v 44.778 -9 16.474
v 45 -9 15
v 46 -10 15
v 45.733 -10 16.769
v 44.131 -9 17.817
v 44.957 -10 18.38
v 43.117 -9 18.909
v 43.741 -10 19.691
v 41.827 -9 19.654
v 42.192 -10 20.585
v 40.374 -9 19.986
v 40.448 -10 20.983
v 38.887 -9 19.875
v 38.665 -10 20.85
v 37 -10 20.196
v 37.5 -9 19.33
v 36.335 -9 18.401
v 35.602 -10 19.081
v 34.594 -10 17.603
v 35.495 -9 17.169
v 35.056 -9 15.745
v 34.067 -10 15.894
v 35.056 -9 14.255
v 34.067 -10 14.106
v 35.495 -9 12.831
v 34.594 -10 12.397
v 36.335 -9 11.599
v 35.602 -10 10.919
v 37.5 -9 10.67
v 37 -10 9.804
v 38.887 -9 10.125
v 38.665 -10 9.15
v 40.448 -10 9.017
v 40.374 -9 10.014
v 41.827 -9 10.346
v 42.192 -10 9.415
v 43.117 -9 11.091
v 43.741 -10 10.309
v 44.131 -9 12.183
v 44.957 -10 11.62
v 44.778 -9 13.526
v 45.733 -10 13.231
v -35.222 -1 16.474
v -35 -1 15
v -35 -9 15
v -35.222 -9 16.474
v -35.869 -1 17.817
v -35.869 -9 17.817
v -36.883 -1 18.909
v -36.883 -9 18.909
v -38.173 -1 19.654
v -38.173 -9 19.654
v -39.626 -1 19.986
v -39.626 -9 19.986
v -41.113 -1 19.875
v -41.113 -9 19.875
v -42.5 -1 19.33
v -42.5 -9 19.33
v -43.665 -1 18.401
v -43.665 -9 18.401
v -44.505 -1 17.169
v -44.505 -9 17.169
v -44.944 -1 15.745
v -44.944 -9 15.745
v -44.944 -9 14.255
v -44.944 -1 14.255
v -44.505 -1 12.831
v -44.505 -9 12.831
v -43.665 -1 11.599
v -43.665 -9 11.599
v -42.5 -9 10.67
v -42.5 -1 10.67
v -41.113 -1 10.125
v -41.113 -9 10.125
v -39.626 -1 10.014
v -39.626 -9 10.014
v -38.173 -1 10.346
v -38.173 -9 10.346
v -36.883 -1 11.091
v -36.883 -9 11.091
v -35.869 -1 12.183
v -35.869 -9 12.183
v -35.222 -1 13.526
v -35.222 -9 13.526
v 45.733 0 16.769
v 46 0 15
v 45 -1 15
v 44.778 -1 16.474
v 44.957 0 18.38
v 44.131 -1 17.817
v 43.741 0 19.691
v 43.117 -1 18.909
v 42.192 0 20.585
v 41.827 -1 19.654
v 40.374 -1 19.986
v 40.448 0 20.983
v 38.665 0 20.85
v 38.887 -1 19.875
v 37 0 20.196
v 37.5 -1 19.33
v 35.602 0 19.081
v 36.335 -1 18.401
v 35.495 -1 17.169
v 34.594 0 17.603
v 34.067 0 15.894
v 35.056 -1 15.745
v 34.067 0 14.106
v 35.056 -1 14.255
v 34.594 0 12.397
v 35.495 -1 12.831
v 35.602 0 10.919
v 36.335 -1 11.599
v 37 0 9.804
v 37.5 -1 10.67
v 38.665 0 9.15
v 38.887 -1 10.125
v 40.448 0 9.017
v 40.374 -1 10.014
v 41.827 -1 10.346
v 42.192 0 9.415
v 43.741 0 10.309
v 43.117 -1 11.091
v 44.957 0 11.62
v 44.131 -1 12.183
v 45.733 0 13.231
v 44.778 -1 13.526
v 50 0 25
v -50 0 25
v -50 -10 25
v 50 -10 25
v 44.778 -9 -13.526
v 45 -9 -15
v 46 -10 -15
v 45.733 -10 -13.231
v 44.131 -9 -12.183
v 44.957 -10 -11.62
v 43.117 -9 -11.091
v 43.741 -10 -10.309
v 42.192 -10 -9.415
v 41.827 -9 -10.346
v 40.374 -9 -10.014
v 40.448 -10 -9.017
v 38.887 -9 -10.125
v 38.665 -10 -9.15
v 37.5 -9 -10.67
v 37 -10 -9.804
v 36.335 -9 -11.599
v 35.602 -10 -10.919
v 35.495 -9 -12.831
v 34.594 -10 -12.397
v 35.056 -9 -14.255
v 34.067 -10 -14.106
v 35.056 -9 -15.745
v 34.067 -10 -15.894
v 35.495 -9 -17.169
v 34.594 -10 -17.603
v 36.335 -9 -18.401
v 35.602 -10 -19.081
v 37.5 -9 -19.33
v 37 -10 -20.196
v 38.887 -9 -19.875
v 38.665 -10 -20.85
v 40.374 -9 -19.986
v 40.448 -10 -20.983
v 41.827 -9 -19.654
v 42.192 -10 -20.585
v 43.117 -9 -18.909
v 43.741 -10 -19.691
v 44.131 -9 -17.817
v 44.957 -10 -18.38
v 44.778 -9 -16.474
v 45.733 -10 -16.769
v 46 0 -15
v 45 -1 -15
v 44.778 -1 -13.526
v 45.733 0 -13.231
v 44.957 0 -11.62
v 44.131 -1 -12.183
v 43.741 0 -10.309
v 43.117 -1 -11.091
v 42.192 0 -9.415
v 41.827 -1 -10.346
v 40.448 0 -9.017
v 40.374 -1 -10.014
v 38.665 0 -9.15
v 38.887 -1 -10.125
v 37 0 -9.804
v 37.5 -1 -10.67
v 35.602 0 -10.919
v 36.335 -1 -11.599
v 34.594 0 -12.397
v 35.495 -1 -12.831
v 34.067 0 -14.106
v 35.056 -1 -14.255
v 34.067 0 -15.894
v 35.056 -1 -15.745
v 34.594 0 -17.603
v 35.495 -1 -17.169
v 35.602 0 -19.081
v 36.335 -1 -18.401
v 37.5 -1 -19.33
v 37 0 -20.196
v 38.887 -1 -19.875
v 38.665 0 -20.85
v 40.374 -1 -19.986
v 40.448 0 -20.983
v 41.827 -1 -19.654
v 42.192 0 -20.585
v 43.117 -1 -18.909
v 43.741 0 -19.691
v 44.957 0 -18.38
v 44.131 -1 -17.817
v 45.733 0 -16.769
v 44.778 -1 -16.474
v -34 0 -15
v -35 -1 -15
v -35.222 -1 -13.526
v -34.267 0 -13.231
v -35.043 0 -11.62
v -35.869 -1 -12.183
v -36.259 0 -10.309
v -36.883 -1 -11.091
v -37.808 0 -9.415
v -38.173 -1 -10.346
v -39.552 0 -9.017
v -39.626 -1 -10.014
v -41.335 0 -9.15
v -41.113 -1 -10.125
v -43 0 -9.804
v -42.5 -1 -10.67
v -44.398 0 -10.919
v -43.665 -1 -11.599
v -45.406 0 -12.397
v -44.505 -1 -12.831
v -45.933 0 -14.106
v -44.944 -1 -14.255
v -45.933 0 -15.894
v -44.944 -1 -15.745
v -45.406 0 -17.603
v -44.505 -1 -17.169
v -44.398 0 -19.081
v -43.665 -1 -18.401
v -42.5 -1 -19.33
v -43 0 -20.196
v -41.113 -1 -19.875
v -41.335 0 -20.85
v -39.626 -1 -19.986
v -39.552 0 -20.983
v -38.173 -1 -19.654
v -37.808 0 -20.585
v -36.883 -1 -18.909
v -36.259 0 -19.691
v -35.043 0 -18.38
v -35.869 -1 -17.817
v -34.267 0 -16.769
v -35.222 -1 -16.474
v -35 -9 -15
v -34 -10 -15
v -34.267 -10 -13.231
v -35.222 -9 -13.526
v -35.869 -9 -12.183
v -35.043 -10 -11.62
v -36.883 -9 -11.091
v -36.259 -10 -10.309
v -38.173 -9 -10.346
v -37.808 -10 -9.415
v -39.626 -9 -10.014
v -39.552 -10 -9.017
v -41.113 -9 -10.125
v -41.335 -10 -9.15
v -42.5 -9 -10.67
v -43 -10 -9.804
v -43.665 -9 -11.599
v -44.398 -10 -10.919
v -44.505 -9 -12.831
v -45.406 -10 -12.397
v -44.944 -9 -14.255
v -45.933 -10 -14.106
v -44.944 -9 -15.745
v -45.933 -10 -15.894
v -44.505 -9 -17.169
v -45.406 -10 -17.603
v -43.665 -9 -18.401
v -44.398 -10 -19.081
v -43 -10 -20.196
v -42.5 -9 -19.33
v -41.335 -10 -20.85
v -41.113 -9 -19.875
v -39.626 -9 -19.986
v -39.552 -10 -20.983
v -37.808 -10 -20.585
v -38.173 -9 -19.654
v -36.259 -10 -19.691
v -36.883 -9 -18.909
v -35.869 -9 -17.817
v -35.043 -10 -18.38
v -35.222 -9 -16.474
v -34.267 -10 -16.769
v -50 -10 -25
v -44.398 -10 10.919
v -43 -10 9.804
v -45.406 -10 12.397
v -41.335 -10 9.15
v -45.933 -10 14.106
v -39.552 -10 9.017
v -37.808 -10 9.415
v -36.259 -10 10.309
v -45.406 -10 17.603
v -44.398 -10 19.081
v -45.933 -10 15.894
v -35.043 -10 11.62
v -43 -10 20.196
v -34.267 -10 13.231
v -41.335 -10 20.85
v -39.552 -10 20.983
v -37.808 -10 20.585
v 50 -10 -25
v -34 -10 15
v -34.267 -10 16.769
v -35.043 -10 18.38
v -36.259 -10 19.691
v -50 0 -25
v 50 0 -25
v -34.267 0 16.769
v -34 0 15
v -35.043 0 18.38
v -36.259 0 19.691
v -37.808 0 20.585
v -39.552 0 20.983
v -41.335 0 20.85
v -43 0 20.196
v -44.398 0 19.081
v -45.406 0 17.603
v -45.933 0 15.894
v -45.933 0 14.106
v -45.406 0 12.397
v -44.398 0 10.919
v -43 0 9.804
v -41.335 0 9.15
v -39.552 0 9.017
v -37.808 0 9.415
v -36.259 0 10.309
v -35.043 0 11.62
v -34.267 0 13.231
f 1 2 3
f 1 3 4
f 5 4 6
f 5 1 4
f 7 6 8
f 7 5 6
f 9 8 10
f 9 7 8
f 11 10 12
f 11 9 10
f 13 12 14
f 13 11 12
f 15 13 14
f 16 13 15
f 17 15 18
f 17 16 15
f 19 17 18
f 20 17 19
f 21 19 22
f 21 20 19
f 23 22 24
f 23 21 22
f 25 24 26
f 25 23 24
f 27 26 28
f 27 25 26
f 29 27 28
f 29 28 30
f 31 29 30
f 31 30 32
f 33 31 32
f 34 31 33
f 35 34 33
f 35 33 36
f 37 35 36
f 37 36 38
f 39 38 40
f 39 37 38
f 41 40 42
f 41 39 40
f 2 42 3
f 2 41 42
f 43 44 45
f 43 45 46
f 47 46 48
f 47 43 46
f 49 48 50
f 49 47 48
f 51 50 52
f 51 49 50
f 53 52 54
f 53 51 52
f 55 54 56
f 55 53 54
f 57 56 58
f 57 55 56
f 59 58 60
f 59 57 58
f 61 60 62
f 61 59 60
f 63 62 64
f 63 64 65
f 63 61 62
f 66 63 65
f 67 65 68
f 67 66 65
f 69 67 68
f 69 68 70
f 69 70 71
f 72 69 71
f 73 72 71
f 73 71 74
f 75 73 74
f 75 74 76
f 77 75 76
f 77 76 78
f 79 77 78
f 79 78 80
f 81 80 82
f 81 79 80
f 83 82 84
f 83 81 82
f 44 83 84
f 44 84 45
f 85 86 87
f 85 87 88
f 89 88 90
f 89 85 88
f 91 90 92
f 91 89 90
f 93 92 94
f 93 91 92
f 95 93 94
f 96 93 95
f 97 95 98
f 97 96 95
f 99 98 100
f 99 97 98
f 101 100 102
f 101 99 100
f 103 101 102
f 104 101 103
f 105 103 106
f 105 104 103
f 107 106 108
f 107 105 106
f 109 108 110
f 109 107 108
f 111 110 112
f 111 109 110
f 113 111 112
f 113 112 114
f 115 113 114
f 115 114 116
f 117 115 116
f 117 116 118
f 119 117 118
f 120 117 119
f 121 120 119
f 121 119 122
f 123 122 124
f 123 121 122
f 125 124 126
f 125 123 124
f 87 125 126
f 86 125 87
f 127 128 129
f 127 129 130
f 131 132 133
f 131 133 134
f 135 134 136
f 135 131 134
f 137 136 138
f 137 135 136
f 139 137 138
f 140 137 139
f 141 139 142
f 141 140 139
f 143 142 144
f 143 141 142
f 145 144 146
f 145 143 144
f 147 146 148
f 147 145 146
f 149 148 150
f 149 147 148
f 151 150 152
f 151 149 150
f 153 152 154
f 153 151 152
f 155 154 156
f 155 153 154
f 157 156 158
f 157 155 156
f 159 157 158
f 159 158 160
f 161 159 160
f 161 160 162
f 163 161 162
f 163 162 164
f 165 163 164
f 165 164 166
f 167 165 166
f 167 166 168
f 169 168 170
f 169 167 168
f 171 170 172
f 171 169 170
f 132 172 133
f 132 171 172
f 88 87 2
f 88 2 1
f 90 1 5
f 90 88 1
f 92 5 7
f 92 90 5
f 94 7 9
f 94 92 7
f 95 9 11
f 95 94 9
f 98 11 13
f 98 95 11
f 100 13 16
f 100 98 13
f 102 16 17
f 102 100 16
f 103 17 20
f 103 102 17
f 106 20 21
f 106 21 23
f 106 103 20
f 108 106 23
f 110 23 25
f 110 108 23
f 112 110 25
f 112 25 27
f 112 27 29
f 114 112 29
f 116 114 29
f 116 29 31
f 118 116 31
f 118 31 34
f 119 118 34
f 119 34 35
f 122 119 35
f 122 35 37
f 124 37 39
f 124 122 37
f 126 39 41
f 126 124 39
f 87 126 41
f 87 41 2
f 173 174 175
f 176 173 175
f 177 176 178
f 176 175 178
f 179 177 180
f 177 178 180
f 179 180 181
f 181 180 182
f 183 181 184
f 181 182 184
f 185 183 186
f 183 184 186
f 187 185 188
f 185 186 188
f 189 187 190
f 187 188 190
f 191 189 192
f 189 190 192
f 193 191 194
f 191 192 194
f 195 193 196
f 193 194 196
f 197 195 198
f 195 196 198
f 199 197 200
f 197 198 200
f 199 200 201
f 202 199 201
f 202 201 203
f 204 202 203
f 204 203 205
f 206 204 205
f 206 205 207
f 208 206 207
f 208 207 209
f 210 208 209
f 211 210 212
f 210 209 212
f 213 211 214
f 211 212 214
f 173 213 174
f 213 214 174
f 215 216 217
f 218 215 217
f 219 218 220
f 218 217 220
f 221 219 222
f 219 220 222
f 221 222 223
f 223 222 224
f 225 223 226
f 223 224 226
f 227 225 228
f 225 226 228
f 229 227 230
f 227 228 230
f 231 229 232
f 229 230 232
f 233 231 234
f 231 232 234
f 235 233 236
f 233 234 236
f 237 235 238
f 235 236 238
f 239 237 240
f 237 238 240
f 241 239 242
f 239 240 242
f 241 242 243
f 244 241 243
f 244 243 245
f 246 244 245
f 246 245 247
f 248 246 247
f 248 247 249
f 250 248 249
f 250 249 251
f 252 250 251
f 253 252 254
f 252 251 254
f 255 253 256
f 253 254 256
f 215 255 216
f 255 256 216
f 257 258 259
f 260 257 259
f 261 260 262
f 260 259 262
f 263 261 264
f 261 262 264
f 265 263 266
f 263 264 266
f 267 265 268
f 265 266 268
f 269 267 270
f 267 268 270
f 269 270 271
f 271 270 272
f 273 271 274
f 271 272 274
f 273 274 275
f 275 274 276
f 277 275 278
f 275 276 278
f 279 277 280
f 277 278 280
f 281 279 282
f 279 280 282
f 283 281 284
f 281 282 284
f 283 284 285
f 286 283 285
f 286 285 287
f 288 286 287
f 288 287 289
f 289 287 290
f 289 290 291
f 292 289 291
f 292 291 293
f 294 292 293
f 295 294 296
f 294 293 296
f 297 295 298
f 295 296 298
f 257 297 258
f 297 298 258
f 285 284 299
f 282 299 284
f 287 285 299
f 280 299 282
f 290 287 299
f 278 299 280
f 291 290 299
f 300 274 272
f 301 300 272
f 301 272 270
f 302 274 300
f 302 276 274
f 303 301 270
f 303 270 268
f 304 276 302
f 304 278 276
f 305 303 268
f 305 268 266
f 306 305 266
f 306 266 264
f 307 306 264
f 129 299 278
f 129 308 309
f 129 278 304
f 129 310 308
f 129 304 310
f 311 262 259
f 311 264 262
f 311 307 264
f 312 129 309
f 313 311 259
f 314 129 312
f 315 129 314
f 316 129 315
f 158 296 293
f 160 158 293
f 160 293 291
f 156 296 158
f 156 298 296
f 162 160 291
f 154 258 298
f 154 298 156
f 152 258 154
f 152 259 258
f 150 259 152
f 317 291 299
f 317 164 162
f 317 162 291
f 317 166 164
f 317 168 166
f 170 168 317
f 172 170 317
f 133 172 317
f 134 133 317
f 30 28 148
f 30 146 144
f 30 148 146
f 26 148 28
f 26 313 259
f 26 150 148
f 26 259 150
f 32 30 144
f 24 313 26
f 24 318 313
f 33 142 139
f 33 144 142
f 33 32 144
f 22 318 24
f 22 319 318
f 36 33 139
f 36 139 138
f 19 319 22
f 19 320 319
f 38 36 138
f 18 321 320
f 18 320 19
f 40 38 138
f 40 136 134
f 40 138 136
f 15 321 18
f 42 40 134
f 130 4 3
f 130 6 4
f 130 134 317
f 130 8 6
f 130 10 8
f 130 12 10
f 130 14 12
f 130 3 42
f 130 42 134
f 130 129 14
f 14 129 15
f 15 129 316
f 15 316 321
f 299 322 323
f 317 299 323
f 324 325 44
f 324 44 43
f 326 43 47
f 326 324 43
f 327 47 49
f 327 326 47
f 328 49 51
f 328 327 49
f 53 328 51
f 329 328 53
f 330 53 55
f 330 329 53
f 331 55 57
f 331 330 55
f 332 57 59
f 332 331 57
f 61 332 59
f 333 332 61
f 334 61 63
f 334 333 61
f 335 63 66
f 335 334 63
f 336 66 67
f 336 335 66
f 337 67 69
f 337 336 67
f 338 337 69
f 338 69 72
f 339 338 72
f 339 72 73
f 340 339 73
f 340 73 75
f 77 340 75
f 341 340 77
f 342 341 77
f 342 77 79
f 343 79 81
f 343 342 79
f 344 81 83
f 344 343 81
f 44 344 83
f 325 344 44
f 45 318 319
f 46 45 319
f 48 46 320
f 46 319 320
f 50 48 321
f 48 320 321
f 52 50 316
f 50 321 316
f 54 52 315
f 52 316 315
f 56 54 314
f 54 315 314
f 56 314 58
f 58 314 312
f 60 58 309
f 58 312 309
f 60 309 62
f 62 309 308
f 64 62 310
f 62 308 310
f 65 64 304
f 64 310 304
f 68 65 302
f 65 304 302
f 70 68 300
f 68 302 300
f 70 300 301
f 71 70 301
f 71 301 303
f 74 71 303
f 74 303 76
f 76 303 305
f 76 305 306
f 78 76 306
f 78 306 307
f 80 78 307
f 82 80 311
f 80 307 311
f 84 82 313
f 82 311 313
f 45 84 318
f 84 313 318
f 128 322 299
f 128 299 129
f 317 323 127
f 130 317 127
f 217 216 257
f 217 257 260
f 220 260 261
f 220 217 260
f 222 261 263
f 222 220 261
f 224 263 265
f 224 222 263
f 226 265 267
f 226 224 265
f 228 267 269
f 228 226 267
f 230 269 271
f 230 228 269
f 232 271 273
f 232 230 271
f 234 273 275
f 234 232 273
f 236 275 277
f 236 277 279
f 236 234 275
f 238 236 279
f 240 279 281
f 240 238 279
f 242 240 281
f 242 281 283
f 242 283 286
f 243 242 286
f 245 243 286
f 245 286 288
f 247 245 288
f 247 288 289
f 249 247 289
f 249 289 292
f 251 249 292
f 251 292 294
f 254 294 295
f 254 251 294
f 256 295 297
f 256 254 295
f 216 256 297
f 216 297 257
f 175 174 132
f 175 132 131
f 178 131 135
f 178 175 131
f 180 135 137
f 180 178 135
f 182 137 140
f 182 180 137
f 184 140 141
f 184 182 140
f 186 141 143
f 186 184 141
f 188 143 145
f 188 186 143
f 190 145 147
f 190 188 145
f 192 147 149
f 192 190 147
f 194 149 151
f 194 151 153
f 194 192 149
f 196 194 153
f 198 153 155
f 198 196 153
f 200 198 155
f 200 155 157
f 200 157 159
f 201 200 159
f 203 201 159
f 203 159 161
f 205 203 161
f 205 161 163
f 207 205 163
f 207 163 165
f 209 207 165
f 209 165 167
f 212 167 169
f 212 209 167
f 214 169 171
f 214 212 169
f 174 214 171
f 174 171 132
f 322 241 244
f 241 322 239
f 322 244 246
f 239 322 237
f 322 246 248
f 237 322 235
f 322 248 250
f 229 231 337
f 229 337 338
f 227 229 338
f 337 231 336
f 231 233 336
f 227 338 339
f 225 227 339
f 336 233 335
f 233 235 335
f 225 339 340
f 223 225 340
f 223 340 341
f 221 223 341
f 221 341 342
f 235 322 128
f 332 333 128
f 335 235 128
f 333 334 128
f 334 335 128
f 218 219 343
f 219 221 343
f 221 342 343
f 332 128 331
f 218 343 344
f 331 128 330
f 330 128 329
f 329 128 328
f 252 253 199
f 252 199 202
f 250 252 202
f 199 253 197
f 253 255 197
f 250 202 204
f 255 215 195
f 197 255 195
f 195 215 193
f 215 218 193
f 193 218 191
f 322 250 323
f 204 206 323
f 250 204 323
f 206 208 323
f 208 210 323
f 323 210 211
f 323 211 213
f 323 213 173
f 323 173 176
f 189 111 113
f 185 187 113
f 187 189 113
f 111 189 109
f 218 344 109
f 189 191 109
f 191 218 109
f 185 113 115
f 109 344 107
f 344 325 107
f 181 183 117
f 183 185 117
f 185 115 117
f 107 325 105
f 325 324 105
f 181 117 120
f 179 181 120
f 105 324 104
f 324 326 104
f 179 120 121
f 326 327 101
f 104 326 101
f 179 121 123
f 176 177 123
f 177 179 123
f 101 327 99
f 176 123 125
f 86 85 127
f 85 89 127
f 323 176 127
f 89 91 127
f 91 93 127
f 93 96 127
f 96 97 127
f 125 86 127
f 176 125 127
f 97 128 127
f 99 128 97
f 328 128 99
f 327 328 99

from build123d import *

# Parameters (mm, degrees)
F0_W     = 100
F0_H     = 50
F0_R     = 5
F1_DEPTH = 10
F2_SIZE  = 1
F3_SIZE  = 1
F4_SIZE  = 1


with BuildPart() as f1:
    # F0 (on Front) → F1 (new body)
    with BuildSketch(Plane.XZ):
        Rectangle(F0_W, F0_H)
        with Locations((-40, -15)):
            Circle(F0_R, mode=Mode.SUBTRACT)
        with Locations((40, -15)):
            Circle(F0_R, mode=Mode.SUBTRACT)
        with Locations((-40, 15)):
            Circle(F0_R, mode=Mode.SUBTRACT)
        with Locations((40, 15)):
            Circle(F0_R, mode=Mode.SUBTRACT)
    extrude(amount=F1_DEPTH)

    # F2
    f2_edges = [f1.edges().sort_by_distance(p)[0] for p in [
        (-45, -10, 15),
        (-45, -10, -15),
    ]]
    chamfer(f2_edges, length=F2_SIZE)

    # F3
    f3_edges = [f1.edges().sort_by_distance(p)[0] for p in [
        (35, -10, 15),
        (35, -10, -15),
    ]]
    chamfer(f3_edges, length=F3_SIZE)

    # F4
    f4_edges = [f1.edges().sort_by_distance(p)[0] for p in [
        (35, 0, 15),
        (-45, 0, 15),
        (-45, 0, -15),
        (35, 0, -15),
    ]]
    chamfer(f4_edges, length=F4_SIZE)


solid = f1.part
